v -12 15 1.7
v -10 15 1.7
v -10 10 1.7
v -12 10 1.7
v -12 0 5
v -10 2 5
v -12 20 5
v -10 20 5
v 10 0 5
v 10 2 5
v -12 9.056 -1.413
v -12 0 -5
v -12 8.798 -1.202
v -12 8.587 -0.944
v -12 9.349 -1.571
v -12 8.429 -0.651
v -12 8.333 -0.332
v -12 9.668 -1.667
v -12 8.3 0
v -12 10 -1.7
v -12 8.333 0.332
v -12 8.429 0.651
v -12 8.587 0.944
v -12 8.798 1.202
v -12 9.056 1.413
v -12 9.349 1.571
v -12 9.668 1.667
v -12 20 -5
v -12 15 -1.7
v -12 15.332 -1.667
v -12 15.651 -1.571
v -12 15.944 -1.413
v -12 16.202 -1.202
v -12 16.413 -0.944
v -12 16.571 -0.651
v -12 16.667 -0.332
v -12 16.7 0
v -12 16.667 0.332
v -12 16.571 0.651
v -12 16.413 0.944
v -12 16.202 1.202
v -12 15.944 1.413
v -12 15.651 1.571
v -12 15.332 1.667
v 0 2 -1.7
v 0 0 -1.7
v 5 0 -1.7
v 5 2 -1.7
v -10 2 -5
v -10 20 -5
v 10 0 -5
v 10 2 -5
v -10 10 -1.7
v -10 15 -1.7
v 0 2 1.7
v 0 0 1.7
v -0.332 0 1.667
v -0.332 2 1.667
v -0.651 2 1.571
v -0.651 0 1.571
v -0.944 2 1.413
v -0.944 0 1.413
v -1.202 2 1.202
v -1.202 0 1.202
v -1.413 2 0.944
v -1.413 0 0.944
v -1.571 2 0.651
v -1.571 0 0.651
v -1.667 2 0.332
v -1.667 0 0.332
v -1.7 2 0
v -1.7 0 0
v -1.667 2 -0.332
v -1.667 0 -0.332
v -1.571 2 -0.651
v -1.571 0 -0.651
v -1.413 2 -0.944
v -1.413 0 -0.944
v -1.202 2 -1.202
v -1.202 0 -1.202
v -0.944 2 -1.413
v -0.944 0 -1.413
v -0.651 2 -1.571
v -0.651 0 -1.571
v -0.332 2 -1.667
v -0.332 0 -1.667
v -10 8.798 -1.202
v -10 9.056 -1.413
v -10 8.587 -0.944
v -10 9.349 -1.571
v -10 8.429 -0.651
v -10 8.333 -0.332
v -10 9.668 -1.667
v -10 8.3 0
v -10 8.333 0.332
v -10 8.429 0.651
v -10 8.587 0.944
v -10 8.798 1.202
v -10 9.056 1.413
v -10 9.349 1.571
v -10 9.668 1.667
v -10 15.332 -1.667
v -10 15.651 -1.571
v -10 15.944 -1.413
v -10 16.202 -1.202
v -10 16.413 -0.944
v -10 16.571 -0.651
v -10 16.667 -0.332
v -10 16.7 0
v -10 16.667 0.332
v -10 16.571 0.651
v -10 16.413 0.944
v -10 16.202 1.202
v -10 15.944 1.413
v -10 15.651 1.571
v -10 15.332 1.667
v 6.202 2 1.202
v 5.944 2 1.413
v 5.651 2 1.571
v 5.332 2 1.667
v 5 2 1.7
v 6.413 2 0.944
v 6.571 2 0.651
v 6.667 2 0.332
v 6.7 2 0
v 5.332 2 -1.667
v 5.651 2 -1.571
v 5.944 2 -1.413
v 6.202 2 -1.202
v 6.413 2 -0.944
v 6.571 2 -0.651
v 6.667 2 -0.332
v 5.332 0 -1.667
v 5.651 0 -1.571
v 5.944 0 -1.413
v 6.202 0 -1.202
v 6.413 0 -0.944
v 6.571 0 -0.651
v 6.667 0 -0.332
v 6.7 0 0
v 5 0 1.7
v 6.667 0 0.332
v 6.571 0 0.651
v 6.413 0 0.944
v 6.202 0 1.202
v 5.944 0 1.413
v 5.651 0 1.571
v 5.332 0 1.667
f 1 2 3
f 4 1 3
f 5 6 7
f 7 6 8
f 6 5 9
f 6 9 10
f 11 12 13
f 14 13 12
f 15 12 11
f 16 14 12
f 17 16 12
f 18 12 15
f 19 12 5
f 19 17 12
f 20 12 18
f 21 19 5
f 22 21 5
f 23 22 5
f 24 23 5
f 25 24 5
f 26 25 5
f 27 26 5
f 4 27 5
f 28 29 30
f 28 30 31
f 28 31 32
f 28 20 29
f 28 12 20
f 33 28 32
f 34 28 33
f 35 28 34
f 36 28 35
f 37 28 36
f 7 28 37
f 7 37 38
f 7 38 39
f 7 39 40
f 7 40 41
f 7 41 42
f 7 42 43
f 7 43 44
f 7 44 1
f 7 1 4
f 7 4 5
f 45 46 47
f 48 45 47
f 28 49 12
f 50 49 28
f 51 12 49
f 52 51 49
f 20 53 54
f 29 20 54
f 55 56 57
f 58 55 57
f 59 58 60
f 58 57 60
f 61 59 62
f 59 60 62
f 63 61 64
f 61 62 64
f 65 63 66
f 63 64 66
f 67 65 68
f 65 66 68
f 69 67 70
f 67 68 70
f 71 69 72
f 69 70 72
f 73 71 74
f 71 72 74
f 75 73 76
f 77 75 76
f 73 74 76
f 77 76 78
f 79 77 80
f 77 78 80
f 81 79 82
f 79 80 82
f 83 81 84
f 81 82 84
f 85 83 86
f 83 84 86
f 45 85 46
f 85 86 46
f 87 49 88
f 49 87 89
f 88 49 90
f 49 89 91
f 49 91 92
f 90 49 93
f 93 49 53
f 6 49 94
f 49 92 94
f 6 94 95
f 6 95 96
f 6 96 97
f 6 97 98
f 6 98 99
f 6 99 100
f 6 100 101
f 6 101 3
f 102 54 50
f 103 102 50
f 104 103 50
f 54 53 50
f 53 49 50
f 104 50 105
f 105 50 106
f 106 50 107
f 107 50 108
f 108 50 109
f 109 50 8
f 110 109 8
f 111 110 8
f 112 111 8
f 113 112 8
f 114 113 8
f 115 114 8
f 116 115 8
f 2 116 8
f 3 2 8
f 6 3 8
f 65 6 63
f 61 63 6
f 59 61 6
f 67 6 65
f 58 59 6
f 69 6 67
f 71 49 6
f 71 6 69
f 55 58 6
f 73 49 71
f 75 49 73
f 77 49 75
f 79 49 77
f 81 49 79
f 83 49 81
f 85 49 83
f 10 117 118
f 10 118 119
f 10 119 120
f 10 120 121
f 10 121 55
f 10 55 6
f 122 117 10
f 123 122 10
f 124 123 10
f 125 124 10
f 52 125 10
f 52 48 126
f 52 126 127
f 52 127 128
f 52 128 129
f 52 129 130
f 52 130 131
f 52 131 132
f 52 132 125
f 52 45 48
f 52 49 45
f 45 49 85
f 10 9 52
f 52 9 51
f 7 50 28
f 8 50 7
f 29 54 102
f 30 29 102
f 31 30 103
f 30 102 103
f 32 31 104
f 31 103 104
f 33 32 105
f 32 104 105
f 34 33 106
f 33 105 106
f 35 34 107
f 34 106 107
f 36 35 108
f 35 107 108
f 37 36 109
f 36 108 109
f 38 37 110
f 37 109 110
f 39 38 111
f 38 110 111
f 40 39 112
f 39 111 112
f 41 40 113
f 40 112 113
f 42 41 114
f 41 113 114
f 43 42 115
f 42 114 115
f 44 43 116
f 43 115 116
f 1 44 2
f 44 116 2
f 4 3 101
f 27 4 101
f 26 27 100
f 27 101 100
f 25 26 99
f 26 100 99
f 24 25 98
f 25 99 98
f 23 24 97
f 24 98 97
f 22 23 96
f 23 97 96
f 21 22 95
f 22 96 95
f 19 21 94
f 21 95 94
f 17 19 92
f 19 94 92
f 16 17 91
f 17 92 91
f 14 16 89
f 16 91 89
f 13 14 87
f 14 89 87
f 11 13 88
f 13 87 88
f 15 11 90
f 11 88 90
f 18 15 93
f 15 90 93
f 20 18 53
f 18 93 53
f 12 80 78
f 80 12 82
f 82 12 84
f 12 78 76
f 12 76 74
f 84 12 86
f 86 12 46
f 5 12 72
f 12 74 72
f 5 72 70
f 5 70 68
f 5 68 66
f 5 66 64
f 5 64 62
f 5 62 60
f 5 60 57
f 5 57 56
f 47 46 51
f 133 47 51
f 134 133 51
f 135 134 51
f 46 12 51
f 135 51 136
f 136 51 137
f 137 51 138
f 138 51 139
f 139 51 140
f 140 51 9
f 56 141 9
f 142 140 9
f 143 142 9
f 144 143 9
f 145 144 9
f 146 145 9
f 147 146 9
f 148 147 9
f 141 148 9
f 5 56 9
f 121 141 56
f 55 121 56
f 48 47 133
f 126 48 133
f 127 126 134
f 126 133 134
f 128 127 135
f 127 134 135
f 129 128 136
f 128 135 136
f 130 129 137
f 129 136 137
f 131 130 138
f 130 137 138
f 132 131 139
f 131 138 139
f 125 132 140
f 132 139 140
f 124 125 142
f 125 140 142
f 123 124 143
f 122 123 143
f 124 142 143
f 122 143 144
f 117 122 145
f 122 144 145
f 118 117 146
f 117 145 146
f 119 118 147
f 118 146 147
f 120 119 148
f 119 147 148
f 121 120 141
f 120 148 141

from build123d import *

# Parameters (mm, degrees)
SKETCH_1_W      = 20
SKETCH_1_H      = 10
EXTRUDE_1_DEPTH = 2
SKETCH_3_W      = 10
SKETCH_3_H      = 20
EXTRUDE_3_DEPTH = 2


with BuildPart() as part:
    # 草图1 → 凸台-拉伸1 (new body)
    with BuildSketch(Plane(origin=(0, 0, 0), x_dir=(1, 0, 0), z_dir=(0, 1, 0))):
        Rectangle(SKETCH_1_W, SKETCH_1_H)
        with BuildLine():
            Line((5, -1.7), (0, -1.7))
            ThreePointArc((0, -1.7), (-1.7, 0), (0, 1.7))
            Line((0, 1.7), (5, 1.7))
            ThreePointArc((5, 1.7), (6.7, 0), (5, -1.7))
        make_face(mode=Mode.SUBTRACT)
    extrude(amount=EXTRUDE_1_DEPTH)

    # 草图3 → 凸台-拉伸3 (add)
    with BuildSketch(Plane.ZY.offset(10)):
        with Locations((0, 10)):
            Rectangle(SKETCH_3_W, SKETCH_3_H)
        with BuildLine():
            Line((1.7, 15), (1.7, 10))
            ThreePointArc((1.7, 10), (0, 8.3), (-1.7, 10))
            Line((-1.7, 10), (-1.7, 15))
            ThreePointArc((-1.7, 15), (0, 16.7), (1.7, 15))
        make_face(mode=Mode.SUBTRACT)
    extrude(amount=EXTRUDE_3_DEPTH)


solid = part.part
